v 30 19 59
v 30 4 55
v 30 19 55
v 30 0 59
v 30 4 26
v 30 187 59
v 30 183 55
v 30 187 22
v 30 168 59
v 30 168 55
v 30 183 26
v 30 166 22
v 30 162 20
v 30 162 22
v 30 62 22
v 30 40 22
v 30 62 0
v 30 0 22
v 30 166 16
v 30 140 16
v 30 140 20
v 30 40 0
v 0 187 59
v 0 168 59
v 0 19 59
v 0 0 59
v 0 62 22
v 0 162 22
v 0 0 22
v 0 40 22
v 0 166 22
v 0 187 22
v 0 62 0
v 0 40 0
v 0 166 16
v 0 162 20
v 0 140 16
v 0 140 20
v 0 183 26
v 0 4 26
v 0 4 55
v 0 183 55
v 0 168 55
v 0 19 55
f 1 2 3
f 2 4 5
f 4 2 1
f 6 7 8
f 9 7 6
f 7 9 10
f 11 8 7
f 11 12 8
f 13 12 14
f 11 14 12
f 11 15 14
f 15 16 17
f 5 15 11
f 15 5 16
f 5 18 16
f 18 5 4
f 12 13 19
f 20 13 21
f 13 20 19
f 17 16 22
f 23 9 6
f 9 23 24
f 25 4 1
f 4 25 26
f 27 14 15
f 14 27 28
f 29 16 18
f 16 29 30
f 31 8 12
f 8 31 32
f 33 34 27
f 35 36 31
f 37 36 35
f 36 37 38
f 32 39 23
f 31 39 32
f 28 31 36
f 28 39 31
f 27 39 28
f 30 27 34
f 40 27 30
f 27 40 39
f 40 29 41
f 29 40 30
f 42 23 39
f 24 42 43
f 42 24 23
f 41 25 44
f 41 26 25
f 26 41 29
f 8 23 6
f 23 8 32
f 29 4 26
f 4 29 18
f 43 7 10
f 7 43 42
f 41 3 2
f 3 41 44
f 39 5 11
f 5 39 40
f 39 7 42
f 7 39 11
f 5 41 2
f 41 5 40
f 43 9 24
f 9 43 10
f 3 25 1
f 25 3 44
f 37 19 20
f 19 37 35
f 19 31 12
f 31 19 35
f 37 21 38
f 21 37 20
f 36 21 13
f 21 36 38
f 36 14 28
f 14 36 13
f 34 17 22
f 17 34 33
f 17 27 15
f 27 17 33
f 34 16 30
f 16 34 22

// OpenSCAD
gancio_y=26;
gancio_z=6;

appoggio=22;

larghezza_tot=30;

eeepc_z=29;
eeepc_y=179;

sp=4;

module gancio(){
    difference(){
    cube([larghezza_tot,gancio_y,gancio_z]);
    translate([0,0,gancio_z-2])cube([larghezza_tot,gancio_y-sp,2]);
         }
    }

module appoggio_inf(){
    cube([larghezza_tot,appoggio,appoggio]);
    }

module corpo(){
    difference(){
        cube([larghezza_tot,eeepc_y+2*sp,eeepc_z+2*sp]);
        translate([0,sp,sp])
        cube([larghezza_tot,eeepc_y,eeepc_z]); // vuoto per eeepc
        translate([0,sp+30/2,sp])
        #cube([larghezza_tot,eeepc_y-30,eeepc_z+sp]); // vuoto per alette superiori
        }
    }

translate([0,0,appoggio])corpo();
translate([0,140,appoggio-gancio_z])gancio();
translate([0,40,0])appoggio_inf();
